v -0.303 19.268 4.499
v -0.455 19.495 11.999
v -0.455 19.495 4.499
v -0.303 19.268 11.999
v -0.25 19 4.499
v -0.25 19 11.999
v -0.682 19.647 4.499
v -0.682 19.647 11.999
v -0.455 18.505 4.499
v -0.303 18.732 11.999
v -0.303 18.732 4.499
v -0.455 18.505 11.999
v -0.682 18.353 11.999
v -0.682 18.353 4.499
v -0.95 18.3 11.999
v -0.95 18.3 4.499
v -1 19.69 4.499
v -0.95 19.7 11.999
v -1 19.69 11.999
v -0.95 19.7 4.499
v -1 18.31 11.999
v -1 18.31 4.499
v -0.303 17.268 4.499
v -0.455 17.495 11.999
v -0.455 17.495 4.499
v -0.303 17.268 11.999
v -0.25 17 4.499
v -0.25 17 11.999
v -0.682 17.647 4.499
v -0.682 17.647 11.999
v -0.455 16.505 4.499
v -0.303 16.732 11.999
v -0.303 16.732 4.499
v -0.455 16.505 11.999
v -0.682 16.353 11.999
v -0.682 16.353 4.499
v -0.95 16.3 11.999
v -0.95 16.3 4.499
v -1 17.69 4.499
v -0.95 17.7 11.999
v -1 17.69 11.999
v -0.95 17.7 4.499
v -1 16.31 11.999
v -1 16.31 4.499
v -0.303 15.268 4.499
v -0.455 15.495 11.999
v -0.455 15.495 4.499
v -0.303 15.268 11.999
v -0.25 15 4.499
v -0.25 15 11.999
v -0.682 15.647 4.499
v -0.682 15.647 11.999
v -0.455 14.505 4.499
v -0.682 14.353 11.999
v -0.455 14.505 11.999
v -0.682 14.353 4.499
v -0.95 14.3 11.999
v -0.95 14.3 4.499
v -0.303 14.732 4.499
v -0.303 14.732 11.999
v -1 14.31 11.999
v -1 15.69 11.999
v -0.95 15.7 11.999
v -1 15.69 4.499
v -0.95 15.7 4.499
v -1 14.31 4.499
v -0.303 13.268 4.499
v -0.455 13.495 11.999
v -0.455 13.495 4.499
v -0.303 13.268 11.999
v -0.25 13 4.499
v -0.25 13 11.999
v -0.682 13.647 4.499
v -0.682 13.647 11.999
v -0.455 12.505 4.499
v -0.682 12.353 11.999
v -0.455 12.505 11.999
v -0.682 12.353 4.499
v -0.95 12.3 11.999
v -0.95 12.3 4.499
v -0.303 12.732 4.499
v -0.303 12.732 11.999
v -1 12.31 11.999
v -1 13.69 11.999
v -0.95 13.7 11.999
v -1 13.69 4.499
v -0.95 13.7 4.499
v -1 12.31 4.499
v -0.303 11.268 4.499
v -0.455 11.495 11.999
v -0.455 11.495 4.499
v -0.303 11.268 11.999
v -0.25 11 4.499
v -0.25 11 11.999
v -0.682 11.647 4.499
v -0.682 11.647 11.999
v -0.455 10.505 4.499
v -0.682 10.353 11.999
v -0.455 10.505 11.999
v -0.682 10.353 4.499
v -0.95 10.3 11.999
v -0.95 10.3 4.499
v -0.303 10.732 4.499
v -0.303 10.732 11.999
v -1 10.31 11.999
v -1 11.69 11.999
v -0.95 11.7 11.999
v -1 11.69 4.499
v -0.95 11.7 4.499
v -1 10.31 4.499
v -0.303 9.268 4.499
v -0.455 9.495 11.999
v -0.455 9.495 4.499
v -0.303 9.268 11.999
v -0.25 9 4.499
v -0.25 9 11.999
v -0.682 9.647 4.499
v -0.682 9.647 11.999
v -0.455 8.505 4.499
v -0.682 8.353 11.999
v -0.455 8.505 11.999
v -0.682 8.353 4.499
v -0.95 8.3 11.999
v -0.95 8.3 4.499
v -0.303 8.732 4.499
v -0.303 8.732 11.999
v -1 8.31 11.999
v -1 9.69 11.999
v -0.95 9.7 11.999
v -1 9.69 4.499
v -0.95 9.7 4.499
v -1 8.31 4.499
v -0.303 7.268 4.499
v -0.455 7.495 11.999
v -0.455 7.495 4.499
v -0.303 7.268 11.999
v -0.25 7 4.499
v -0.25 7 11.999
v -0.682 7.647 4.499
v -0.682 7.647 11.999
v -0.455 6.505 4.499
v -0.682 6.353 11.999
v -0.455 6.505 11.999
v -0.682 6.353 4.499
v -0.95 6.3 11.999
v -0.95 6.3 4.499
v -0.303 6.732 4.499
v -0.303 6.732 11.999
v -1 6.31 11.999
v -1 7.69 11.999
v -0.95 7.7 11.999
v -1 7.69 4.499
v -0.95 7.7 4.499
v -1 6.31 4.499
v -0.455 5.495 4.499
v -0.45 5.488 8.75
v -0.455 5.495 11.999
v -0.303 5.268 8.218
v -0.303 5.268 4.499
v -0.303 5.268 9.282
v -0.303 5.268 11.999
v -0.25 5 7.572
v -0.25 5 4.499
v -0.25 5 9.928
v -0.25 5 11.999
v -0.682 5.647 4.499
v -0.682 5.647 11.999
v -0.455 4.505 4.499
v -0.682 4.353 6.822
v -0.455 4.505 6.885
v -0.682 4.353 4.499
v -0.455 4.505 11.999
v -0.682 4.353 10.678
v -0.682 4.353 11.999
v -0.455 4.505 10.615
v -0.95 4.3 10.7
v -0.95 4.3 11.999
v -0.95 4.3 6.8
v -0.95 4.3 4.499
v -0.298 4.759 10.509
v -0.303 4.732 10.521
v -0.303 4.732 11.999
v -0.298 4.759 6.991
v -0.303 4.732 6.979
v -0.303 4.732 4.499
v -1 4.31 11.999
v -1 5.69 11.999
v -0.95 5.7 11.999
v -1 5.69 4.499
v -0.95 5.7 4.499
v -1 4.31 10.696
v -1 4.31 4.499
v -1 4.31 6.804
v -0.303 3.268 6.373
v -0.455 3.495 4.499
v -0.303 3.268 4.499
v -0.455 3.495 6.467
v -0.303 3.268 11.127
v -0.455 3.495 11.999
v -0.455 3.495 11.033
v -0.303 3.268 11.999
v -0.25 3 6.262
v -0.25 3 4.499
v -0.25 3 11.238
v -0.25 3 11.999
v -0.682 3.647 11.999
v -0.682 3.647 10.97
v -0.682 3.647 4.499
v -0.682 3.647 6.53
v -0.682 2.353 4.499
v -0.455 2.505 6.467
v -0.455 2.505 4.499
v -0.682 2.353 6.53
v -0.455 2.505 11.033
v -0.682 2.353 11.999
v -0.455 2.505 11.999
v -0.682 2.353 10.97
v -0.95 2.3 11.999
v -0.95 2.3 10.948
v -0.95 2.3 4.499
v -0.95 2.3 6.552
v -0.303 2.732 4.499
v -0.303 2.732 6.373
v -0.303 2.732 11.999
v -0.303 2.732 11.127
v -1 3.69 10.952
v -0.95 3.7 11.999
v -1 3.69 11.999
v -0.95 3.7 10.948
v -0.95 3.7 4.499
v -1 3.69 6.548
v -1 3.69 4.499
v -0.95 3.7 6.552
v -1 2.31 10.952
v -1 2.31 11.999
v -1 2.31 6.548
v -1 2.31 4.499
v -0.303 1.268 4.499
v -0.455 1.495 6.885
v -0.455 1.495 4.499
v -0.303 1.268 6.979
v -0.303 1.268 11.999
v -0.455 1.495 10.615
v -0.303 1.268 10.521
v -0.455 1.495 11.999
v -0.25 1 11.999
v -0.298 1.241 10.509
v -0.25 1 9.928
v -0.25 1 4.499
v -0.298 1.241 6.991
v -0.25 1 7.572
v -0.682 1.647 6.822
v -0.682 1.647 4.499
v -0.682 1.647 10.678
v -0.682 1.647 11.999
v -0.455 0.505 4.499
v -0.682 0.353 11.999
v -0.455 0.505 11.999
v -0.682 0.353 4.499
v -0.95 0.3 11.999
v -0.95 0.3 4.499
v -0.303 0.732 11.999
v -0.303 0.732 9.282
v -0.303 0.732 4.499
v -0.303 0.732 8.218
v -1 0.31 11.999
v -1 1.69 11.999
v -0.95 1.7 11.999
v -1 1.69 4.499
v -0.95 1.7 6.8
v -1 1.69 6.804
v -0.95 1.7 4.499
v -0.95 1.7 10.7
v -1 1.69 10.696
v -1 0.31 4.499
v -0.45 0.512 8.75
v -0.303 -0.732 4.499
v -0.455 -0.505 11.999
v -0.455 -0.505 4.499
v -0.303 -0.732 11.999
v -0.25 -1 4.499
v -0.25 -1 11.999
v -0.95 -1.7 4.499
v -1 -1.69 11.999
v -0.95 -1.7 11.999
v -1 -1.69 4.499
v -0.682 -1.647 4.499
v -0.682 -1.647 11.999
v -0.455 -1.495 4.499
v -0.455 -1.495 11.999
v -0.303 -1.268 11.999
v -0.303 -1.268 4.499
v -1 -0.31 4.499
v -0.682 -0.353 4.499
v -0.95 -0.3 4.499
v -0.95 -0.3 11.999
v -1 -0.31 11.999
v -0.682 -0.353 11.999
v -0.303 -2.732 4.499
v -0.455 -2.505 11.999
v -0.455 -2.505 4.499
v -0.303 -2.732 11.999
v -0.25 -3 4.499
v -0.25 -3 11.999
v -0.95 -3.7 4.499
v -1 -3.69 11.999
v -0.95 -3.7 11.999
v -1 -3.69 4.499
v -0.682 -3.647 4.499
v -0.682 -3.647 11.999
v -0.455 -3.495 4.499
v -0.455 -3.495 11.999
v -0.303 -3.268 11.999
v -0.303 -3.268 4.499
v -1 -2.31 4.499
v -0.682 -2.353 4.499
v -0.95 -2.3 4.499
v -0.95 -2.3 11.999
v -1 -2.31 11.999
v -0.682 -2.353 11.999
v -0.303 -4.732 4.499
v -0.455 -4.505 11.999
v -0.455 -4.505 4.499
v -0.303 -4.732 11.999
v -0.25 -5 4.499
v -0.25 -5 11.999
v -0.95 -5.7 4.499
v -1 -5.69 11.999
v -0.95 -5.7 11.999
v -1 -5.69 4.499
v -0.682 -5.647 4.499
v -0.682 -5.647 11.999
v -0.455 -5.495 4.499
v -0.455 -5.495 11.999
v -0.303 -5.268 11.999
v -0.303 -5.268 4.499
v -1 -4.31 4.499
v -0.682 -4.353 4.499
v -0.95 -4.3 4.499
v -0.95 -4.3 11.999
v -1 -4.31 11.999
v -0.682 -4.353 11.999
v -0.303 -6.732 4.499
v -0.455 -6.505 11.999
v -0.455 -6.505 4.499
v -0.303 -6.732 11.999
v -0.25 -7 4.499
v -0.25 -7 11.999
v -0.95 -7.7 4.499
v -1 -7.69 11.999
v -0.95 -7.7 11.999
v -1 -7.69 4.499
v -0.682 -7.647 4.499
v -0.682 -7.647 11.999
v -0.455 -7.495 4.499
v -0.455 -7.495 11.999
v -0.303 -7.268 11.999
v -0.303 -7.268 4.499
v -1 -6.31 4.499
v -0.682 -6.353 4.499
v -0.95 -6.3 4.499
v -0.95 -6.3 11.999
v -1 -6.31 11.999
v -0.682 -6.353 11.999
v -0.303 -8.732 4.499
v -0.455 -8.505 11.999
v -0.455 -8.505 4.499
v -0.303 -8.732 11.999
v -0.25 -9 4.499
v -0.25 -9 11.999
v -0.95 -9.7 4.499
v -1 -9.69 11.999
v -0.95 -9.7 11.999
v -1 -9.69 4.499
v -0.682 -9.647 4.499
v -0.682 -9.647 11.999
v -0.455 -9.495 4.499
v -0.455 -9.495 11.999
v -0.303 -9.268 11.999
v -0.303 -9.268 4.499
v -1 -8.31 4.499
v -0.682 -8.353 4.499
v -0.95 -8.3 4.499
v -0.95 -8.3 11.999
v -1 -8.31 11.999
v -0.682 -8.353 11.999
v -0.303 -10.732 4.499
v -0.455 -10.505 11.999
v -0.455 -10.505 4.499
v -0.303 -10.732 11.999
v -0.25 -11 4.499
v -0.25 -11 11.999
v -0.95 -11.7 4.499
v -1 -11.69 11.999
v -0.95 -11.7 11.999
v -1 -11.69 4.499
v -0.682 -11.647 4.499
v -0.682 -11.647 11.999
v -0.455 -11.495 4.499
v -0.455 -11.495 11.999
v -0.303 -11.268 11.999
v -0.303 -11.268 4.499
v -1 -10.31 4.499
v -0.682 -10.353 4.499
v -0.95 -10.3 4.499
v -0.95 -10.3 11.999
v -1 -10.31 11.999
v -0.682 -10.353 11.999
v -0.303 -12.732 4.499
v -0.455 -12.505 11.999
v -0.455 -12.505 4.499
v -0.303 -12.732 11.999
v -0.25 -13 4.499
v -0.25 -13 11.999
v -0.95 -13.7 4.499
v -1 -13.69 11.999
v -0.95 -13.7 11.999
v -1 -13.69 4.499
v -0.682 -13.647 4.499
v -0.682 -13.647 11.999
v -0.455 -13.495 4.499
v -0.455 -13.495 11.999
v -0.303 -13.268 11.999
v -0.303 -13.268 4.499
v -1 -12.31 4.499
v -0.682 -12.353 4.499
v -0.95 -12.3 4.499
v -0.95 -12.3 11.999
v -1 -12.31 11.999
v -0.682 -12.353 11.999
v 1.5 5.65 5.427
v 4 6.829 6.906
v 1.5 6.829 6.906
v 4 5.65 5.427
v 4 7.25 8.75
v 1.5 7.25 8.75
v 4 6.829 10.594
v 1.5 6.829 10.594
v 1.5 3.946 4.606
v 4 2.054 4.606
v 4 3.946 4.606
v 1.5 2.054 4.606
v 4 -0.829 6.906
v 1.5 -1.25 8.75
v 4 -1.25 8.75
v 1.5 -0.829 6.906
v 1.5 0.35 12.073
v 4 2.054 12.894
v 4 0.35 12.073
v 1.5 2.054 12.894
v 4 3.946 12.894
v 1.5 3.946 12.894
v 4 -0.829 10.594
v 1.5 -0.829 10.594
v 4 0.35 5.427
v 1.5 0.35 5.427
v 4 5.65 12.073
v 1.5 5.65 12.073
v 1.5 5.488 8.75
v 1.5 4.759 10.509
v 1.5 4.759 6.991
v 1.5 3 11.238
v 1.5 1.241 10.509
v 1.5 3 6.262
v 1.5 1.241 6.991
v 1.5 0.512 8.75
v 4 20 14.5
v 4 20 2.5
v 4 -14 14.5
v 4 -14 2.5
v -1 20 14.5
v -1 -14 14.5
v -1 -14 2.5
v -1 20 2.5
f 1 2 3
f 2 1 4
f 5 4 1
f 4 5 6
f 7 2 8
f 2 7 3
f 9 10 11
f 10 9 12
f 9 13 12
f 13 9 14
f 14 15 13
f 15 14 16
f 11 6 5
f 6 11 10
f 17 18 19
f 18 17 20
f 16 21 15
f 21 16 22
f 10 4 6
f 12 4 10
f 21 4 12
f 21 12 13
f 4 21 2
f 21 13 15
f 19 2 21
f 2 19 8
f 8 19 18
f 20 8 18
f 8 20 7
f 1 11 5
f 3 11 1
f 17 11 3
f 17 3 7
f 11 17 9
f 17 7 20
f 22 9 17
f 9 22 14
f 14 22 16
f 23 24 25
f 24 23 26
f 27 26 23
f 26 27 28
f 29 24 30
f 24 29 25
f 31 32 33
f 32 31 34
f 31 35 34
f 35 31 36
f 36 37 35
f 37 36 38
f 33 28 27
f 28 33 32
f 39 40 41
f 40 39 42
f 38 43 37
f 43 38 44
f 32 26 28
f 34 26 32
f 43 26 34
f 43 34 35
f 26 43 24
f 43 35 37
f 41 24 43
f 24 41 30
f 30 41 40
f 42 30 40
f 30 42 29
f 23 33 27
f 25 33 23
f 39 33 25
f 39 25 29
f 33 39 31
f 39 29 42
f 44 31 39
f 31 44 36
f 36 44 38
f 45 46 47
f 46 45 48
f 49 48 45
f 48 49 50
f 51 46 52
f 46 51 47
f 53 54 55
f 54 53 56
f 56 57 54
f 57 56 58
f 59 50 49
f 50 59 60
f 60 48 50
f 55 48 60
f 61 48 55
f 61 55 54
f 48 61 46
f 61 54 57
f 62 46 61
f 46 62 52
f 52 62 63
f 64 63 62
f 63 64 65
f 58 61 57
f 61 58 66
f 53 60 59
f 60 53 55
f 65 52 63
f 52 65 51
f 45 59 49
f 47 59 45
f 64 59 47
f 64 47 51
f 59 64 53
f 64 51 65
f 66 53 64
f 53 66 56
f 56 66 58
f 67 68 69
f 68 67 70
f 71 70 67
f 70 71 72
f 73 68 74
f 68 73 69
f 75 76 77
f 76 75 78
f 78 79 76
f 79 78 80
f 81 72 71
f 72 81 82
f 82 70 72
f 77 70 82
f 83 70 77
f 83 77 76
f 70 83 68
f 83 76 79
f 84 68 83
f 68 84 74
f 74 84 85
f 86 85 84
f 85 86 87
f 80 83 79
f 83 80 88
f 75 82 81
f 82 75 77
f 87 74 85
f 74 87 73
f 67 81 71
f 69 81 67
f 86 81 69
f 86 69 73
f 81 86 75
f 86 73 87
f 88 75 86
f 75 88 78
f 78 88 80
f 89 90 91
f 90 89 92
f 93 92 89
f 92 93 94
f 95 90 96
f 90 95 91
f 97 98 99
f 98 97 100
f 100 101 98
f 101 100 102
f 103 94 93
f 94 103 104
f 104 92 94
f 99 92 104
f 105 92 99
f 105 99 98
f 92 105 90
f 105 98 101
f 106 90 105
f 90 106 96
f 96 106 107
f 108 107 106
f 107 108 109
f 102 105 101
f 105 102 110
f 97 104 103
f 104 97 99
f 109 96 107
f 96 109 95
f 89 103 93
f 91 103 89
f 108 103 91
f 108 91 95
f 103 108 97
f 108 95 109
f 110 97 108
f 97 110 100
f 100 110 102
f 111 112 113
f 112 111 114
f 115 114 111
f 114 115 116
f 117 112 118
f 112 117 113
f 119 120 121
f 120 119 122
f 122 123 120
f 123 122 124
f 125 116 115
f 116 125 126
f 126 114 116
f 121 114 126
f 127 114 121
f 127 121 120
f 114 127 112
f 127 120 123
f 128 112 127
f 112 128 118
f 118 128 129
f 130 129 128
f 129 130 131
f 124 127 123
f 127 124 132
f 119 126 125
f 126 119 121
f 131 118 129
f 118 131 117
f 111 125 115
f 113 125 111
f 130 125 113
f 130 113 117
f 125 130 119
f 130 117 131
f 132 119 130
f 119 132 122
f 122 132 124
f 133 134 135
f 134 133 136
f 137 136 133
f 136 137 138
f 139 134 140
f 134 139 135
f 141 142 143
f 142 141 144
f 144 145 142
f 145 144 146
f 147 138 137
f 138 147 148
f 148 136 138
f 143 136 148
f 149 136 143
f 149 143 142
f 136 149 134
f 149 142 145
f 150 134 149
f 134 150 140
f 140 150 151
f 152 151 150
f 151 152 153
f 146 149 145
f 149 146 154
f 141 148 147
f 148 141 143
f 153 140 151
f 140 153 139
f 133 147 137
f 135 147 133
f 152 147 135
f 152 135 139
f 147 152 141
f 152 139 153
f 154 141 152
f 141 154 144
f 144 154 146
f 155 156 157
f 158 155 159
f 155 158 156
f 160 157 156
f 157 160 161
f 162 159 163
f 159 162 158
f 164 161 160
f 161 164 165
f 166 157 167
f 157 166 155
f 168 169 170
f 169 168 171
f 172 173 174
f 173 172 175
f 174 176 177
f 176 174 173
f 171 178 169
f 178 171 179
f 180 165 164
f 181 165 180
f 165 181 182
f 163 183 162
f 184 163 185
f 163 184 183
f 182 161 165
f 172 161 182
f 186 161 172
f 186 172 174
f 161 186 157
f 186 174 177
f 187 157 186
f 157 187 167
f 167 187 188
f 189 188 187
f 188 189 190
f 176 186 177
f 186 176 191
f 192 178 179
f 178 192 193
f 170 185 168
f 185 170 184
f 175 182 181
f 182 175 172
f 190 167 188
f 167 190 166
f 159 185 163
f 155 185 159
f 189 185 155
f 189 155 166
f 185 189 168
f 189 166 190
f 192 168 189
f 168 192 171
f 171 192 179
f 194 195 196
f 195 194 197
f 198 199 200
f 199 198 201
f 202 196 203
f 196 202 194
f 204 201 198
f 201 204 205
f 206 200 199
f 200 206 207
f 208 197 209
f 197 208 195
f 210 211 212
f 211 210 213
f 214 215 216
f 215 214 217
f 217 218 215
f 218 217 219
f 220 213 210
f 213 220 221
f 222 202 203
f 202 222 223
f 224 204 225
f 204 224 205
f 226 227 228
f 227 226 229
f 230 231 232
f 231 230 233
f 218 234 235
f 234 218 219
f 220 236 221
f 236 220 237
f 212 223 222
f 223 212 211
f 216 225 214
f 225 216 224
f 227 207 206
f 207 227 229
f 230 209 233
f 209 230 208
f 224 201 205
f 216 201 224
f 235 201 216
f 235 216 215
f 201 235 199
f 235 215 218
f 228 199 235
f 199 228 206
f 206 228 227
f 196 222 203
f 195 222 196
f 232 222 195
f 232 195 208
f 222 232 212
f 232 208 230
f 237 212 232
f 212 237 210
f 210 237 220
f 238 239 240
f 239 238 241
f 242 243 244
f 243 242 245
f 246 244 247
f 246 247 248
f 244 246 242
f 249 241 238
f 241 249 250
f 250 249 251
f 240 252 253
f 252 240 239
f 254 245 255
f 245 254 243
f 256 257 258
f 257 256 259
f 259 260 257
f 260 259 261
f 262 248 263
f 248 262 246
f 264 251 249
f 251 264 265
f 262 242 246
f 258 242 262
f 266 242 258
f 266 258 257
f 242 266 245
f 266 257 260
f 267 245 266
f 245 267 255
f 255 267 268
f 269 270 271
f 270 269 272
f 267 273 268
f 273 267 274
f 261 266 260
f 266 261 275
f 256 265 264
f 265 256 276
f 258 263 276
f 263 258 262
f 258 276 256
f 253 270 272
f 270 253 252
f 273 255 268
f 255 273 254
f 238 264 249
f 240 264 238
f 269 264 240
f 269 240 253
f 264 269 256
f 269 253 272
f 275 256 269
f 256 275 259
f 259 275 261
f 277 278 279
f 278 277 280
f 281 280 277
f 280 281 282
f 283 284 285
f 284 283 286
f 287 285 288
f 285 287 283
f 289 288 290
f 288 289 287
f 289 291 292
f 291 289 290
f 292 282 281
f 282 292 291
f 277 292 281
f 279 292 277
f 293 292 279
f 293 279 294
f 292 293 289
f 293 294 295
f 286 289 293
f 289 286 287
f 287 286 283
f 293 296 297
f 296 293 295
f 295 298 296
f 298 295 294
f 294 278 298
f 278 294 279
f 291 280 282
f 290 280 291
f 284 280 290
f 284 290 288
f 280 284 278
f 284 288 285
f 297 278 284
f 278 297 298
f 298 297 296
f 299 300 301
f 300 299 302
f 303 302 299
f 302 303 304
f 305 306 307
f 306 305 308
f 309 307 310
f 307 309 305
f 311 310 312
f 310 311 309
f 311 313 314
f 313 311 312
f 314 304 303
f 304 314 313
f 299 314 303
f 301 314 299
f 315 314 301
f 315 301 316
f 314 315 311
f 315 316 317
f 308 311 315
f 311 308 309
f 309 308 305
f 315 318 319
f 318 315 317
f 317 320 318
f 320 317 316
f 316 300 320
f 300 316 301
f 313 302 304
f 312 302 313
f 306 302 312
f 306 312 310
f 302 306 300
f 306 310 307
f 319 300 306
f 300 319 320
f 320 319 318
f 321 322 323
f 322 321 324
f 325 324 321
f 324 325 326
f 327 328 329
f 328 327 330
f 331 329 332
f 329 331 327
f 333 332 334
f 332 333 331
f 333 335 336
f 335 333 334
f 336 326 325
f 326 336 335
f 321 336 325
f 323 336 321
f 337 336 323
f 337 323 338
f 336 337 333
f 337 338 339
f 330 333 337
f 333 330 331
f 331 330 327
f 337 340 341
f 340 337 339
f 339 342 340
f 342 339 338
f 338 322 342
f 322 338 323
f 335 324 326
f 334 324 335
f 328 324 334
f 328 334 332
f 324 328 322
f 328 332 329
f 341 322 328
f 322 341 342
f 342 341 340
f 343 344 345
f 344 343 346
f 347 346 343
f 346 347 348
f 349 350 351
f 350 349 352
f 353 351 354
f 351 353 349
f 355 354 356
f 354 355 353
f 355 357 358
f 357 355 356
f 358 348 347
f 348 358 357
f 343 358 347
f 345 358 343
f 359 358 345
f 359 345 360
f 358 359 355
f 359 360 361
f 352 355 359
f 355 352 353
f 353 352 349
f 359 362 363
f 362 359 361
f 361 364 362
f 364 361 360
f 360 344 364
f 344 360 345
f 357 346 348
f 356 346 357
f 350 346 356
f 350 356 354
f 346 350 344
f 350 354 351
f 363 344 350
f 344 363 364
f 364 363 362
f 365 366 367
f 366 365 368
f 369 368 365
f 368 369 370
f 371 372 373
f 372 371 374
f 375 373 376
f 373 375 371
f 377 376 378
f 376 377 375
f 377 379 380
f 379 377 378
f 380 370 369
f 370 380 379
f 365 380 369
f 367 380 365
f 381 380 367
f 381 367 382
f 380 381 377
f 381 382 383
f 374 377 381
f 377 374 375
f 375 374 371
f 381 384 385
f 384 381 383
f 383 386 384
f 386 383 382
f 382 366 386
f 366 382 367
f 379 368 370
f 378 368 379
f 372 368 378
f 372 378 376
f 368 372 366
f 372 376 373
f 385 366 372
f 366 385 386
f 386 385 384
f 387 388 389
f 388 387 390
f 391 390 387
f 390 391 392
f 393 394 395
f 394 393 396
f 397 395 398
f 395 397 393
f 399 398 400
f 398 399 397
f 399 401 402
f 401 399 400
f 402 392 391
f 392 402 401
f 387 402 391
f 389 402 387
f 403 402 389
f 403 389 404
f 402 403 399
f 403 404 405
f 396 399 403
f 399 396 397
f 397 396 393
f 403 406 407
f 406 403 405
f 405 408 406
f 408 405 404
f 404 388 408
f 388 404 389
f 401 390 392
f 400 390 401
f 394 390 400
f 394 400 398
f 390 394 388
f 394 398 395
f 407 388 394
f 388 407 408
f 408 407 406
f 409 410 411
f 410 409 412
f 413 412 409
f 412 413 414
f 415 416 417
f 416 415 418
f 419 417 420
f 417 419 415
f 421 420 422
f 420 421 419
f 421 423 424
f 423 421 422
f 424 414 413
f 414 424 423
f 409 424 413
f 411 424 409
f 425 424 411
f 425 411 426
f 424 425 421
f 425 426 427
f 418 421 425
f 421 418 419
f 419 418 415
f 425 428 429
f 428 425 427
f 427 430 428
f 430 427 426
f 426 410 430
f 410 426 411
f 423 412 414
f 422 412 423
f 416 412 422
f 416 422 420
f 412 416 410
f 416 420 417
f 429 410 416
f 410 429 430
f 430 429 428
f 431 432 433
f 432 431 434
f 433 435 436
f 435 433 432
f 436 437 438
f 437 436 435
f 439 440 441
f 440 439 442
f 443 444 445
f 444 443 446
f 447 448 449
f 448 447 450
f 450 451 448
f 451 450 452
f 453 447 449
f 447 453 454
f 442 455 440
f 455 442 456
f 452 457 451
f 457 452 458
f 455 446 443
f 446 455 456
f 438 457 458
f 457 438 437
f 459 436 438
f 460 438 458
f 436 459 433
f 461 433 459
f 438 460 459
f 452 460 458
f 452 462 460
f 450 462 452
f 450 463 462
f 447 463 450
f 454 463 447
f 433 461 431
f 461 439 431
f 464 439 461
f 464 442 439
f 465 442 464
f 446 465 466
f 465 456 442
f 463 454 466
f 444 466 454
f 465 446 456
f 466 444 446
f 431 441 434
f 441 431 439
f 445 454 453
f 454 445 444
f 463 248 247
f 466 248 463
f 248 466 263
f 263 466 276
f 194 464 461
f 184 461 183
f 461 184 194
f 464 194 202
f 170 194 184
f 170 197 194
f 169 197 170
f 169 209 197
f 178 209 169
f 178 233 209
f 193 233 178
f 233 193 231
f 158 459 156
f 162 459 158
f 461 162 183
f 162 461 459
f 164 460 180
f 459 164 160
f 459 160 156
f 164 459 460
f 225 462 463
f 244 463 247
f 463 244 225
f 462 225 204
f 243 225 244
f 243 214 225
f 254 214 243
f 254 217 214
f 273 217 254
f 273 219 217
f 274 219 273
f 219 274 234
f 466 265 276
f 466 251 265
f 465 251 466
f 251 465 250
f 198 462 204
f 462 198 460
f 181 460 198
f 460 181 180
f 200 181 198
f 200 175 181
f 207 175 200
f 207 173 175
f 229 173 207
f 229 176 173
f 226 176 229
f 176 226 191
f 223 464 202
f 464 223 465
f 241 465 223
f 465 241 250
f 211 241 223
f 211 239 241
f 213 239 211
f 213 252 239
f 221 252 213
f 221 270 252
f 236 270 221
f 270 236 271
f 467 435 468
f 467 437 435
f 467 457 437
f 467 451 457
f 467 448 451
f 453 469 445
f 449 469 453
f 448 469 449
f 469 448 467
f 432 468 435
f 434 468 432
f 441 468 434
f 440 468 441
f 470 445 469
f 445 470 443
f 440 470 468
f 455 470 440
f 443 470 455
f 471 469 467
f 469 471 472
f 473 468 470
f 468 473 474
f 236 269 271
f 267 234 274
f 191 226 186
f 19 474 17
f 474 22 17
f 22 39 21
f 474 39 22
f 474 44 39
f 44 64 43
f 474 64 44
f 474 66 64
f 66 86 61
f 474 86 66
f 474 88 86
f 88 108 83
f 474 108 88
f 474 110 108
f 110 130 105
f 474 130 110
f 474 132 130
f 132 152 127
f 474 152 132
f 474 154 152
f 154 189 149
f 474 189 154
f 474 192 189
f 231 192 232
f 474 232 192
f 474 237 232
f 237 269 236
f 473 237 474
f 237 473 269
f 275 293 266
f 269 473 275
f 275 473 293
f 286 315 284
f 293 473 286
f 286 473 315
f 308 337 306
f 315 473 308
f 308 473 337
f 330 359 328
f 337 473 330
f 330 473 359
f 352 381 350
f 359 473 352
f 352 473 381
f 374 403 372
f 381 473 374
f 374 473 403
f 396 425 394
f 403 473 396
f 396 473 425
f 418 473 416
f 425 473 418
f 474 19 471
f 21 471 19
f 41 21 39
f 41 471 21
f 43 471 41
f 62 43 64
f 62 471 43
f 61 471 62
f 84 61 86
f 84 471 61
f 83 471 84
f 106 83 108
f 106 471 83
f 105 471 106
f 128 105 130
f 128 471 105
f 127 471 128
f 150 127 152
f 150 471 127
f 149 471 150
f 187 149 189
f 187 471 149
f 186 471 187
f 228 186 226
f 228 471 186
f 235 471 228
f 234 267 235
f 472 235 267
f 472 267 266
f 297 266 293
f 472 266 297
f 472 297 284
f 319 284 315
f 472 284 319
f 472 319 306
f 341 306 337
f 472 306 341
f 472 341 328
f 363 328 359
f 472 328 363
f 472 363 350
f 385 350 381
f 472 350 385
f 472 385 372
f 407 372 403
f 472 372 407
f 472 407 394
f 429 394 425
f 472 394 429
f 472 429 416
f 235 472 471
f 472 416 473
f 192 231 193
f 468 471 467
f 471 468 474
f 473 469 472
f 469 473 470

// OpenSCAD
// Kossel Mini carriage for IGUS DryLin TWE-04-12
// Licence: CC BY-SA 3.0, http://creativecommons.org/licenses/by-sa/3.0/
// Author: Dominik Scholz <schlotzz@schlotzz.com> and contributors
// Based upon: https://github.com/jcrocholl/kossel/blob/master/carriage.scad by jcrocholl
// visit: http://www.schlotzz.com
use <MCAD/nuts_and_bolts.scad>;

// Increase this if your slicer or printer make holes too tight.
extra_radius = 0.4;

// OD = outside diameter, corner to corner.
m3_nut_od = 6.1;
m3_nut_radius = m3_nut_od/2 + 0.2 + extra_radius;
m3_washer_radius = 3.5 + extra_radius;

// Major diameter of metric 3mm thread.
m3_major = 2.85;
m3_radius = m3_major/2 + extra_radius;
m3_wide_radius = m3_major/2 + extra_radius + 0.2;



separation = 50;
thickness = 4;

horn_thickness = 13;
horn_x = 8;

belt_width = 5;
belt_x = 5.6;
belt_z = 7;
clearance = 0.125;

module tooth_cutout(x,y)
{
//tooth cutout
				for (x = [1.125 - 0.300 - clearance, 5.375 + 0.30 - clearance])
				{
					for (y = [0 : 19])
					{
						translate([x, 19 - y * 2, 6 - 0.001])
							cylinder(r = 0.7, h = horn_thickness / 2 + 1, $fn = 16);
                                        }
				}
               translate([8,17-14,2.25+8]) rotate([270,0,90]) boltHole(5,length=5);
                        
}

module body(){
    translate([-1,-14,4.5-2]) cube([5,34,12]);
}

module belt_clamp()
{
    difference(){
        body();
        translate([-6.5,0,-1.5]) tooth_cutout(0,0);
    }
    
}



module carriage()
{

	clearance = 0.125;

	// timing belt, up and down
	//for (x = [-belt_x, belt_x])
                x = belt_x;
		

	difference()
	{

	    union()
		{
			

			


			// belt clamps for GT2
			difference()
			{
				union()
				{
                                        y=12;
					{
						union()
						{
							translate([-0.5 - clearance * 2, y, horn_thickness / 2 + 1])
								cube([1, 14, horn_thickness - 2], center = true);
							translate([-1 - clearance * 2, y, horn_thickness / 2 + 1])
								cube([2, 12, horn_thickness - 2], center = true);
							n = 6;
								translate([-1 - clearance * 2, y + n, horn_thickness / 2 + 1])
									cylinder(r = 1, h = horn_thickness - 2, center = true, $fn = 16);

							translate([3.25 - clearance, y, horn_thickness / 2 + 1])
								cube([5, 14, horn_thickness - 2], center = true);

							translate([7.5, y, horn_thickness / 2 + 1])
								cube([2, 14, horn_thickness - 2], center = true);
						}
					}
				}

				// tooth cutout
				for (x = [1.125 - 0.300 - clearance, 5.375 + 0.30 - clearance])
				{
					for (y = [0 : 19])
					{
						translate([x, 19 - y * 2, 6 - 0.001])
							cylinder(r = 0.7, h = horn_thickness / 2 + 1, $fn = 16);
					}
				}

				// cutout for easier inserting of belt
				for (x = [0.5 - clearance, 6 - clearance])
					translate([x, 0, horn_thickness])
						rotate([0, 45, 0])
							cube([2 + clearance / 2, 50, 2 + clearance / 2], center = true);

			}

		}

		

	}

}

belt_clamp();
